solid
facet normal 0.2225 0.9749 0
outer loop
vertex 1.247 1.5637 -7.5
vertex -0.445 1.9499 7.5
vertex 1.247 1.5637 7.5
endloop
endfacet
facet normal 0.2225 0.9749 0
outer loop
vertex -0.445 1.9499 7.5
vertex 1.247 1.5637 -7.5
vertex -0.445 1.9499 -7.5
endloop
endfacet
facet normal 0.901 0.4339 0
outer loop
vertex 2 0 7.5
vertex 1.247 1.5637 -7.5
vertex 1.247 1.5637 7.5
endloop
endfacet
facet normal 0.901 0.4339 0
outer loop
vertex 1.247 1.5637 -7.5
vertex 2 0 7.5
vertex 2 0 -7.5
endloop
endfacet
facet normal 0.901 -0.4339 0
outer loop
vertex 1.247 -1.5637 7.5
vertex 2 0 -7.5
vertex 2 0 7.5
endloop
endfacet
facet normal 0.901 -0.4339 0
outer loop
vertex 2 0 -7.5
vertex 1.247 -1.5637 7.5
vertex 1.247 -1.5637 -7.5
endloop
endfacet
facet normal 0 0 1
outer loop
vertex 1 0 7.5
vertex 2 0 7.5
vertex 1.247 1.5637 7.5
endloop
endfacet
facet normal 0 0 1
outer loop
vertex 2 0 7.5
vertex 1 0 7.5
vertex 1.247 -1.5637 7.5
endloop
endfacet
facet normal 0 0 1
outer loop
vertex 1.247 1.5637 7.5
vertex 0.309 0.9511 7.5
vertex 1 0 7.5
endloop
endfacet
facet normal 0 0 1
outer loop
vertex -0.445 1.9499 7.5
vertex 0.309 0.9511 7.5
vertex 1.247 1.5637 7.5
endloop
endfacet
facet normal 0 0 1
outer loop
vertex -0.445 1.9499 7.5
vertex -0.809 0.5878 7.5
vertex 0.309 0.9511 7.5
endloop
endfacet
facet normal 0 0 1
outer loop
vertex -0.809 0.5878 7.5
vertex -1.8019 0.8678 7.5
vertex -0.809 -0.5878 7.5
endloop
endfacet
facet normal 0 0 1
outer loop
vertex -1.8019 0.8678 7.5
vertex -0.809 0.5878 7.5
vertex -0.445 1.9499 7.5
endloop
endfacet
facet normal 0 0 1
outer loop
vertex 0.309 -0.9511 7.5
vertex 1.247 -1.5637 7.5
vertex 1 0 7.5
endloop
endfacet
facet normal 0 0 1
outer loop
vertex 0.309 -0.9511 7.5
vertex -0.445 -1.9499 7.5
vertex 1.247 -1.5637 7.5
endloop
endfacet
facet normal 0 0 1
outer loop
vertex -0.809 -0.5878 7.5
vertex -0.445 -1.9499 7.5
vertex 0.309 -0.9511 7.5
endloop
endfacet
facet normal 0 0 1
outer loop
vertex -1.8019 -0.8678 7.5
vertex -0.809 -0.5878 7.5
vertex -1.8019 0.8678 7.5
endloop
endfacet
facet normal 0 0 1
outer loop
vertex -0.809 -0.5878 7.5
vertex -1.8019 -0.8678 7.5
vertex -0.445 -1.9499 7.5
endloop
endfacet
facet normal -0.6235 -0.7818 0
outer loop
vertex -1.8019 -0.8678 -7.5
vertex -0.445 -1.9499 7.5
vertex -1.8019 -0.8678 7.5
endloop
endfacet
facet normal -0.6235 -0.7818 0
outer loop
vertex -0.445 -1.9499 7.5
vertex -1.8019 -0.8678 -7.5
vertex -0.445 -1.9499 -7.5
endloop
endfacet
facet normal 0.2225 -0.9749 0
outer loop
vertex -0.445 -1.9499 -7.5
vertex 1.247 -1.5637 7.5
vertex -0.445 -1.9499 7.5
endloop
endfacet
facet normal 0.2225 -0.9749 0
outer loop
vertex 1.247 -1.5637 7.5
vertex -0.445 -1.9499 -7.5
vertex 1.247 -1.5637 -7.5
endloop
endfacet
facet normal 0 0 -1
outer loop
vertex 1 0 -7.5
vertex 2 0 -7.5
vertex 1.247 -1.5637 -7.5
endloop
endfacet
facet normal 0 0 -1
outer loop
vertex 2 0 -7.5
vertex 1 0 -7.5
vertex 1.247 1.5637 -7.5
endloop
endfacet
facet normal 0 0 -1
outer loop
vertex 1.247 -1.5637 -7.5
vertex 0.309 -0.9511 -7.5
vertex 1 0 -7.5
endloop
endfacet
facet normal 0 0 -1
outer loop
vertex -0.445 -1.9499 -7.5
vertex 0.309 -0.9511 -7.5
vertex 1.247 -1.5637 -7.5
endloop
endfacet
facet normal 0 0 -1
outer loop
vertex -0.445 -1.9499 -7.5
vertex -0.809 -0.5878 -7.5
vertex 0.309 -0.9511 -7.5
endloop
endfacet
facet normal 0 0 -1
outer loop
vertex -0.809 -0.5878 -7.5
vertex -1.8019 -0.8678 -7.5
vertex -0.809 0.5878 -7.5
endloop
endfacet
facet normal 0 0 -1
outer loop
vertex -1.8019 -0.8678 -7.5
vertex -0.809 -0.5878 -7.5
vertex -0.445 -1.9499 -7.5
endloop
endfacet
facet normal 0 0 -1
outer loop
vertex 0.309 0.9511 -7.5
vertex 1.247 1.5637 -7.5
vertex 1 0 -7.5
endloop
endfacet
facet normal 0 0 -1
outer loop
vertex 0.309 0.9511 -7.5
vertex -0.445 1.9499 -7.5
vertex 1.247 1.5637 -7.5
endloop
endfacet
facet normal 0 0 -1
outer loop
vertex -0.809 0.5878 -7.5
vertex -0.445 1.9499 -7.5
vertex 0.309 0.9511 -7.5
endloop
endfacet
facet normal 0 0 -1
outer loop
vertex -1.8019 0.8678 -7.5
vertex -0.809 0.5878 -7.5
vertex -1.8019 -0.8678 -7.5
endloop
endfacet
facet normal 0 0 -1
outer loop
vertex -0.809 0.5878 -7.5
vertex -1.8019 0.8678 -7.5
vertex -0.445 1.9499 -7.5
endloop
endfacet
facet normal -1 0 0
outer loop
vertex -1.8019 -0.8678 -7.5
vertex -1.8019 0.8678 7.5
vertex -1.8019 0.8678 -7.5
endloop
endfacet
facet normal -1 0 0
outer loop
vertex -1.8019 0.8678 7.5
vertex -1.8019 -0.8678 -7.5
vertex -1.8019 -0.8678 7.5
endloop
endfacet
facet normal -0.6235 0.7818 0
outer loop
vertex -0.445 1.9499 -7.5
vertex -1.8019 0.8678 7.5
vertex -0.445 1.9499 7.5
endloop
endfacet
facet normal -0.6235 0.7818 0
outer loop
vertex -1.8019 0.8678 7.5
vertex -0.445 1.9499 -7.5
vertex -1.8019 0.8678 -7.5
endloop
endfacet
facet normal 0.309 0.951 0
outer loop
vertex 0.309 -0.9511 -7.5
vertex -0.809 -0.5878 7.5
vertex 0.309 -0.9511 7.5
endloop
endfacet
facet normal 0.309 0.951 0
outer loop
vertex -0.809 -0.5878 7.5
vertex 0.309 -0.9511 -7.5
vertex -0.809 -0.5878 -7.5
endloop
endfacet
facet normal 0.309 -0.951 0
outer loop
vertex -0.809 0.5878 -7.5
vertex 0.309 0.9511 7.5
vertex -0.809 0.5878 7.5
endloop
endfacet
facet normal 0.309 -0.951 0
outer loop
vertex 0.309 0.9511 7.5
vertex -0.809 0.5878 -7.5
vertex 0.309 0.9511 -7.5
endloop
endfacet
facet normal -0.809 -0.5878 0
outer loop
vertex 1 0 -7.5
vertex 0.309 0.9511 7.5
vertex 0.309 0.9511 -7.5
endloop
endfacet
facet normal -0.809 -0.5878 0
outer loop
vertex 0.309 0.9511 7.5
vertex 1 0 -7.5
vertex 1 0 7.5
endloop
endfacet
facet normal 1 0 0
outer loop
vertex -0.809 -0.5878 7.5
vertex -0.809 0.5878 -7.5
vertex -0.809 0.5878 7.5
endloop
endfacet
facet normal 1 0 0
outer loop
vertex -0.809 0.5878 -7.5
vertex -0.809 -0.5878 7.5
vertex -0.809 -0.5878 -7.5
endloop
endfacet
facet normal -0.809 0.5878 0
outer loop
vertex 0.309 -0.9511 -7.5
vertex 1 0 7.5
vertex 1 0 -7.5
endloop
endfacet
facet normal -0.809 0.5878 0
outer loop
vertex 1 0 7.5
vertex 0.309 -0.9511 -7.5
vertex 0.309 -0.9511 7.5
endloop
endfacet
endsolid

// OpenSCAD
// Parameters
length = 15; //[8:30:1]
center = 1; //[0:1:1]
forced_id = 0; //[0:10:0.1]
type_od = 4; //[2:8:0.1]
type_id = 2; //[1:6:0.1]
id = 2; //[1:6:0.1]
od = 4; //[2:10:0.1]
wall_min = 0.5; //[0.2:2:0.1]
overlap = 1; //[0.5:2:0.1]

// Tubing - complete geometry
module tubing() {
  color([0.85, 0.85, 0.8]) { // Off-white for PTFE
    difference() {
      // Outer cylinder
      cylinder(h=length, r=max(od/2, (id/2 + wall_min)), center=true);
      // Inner cutter cylinder
      cylinder(h=length + overlap*2, r=id/2, center=true);
    }
  }
}

// Assembly
module assembly() {
  translate([0, 0, center*(0) + (1-center)*(length/2)]) tubing();
}

assembly();
